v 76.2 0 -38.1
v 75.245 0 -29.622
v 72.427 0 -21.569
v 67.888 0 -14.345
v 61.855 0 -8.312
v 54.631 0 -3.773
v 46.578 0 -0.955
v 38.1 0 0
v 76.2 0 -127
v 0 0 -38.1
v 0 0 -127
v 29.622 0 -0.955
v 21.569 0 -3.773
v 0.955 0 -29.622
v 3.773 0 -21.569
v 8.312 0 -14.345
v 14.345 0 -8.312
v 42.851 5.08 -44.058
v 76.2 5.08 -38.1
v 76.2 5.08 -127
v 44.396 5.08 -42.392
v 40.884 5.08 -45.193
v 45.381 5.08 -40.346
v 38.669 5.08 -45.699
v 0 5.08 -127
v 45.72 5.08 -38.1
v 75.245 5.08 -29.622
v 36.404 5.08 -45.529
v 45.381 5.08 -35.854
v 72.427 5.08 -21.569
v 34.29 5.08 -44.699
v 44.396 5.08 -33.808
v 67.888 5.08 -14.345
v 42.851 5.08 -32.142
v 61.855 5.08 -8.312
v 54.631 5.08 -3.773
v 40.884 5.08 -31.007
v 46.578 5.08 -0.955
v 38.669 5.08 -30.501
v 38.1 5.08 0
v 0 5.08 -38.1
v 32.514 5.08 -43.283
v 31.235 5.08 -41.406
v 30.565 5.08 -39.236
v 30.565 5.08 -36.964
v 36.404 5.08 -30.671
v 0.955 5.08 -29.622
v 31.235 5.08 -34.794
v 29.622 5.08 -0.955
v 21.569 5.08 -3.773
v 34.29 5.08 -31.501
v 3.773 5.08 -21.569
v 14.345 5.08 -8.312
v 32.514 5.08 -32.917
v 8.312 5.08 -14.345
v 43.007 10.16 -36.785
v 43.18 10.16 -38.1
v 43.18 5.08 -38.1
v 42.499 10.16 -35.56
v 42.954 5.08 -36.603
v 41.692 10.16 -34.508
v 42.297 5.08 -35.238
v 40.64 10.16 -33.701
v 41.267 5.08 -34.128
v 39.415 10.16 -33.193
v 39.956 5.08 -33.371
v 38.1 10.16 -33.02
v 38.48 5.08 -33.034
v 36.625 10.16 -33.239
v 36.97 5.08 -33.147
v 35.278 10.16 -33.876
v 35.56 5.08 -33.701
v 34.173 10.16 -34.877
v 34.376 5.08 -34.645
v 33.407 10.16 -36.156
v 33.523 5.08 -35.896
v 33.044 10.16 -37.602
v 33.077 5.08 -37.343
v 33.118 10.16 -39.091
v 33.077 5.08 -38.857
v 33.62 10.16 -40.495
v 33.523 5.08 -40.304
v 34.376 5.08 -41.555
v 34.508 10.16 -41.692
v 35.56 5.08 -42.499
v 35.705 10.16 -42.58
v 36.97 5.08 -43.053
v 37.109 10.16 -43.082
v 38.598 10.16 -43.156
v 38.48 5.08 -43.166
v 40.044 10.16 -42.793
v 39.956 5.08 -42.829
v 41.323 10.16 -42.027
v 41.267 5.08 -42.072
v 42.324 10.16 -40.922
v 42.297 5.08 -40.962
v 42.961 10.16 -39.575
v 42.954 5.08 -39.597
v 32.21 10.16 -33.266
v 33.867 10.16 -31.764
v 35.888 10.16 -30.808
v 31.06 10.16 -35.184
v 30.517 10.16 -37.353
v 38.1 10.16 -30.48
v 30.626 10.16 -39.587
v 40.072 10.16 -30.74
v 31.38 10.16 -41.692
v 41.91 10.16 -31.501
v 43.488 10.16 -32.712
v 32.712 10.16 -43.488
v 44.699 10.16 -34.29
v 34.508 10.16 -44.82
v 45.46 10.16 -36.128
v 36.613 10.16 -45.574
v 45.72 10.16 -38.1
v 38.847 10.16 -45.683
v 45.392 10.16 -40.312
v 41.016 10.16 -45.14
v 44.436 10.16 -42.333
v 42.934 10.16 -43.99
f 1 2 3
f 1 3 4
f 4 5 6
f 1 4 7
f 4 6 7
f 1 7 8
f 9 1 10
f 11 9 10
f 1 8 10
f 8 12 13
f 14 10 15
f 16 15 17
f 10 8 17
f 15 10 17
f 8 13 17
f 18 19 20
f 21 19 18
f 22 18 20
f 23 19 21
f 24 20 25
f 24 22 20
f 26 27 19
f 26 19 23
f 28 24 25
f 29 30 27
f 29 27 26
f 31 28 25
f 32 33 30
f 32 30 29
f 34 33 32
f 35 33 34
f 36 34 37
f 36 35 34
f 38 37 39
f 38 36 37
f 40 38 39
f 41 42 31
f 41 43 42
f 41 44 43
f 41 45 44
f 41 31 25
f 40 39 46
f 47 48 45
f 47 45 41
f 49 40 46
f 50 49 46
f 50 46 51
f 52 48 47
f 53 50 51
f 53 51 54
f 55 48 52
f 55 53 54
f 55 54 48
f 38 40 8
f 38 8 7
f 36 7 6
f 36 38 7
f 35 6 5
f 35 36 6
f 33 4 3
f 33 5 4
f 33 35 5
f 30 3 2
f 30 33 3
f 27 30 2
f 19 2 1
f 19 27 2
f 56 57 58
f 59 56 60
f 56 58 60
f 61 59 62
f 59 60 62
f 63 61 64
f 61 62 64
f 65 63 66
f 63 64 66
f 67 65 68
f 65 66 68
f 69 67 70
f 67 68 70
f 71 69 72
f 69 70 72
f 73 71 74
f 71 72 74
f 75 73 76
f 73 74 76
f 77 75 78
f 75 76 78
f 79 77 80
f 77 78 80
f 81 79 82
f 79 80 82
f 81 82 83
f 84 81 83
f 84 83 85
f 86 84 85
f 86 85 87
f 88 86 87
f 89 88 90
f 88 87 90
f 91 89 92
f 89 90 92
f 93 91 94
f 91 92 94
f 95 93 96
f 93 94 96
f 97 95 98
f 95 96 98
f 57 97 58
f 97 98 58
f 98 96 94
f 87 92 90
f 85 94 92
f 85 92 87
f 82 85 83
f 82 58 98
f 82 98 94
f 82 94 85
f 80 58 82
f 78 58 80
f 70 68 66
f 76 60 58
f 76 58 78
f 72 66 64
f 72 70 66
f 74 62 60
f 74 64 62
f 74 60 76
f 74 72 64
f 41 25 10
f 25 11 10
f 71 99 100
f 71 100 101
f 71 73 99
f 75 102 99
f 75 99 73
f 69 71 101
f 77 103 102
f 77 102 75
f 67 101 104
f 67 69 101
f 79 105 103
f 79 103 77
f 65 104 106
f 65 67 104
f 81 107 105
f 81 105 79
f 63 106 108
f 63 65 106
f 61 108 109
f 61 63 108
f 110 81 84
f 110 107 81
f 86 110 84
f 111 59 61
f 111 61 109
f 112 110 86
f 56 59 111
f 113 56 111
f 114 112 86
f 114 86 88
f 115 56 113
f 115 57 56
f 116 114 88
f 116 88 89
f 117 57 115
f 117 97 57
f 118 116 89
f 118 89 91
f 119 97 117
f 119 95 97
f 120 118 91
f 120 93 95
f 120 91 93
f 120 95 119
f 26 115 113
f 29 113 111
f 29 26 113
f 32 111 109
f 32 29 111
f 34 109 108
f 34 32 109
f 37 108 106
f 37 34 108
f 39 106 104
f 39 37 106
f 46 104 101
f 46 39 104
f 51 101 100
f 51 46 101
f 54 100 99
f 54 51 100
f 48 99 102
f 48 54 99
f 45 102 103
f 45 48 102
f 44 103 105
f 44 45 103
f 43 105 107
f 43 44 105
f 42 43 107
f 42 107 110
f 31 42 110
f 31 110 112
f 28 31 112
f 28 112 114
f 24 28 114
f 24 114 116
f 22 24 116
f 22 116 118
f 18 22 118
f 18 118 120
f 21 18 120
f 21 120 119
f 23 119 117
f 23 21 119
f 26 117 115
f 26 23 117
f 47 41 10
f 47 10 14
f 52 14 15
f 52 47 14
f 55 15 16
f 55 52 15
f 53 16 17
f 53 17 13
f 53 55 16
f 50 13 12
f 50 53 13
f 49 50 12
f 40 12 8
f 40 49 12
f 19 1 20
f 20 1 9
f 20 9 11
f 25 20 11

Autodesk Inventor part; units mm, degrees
ref_plane "YZ Plane" through (0, 0, 0) normal (1, 0, 0) x (0, 1, 0)
ref_plane "XZ Plane" through (0, 0, 0) normal (0, 1, 0) x (-1, 0, 0)
ref_plane "XY Plane" through (0, 0, 0) normal (0, 0, 1) x (1, 0, 0)
sketch "Sketch1" plane through (0, 0, 0) normal (0, 1, 0) x (-1, 0, 0)
  line L0 (0, 0) -> (-76.2, 0)
  line L1 (-76.2, 0) -> (-76.2, -127)
  line L2 (-76.2, -127) -> (0, -127)
  line L3 (0, -127) -> (0, 0)
  dimension "d0" = 76.2
  dimension "d1" = 127
extrude "Extrusion1" add sketch "Sketch1" along normal blind 5.08
fillet "Fillet1" radius 38.1 2 edges at (76.2, 2.54, 0) (0, 2.54, 0)
sketch "Sketch2" plane through (0, 5.08, 0) normal (0, 1, 0) x (1, 0, 0)
  arc A0 (0, 38.1) -> (76.2, 38.1) centre (38.1, 38.1) ccw projected
  line L0 (38.1, 0) -> (38.1, 38.1)
  circle A1 centre (38.1, 38.1) radius 7.62
  circle A2 centre (38.1, 38.1) radius 5.08
  point P0 (0, 0)
  dimension "d5" = 15.24
  dimension "d6" = 10.16
extrude "Extrusion2" add sketch "Sketch2" along normal blind 5.08
properties part number "daodwaw"
